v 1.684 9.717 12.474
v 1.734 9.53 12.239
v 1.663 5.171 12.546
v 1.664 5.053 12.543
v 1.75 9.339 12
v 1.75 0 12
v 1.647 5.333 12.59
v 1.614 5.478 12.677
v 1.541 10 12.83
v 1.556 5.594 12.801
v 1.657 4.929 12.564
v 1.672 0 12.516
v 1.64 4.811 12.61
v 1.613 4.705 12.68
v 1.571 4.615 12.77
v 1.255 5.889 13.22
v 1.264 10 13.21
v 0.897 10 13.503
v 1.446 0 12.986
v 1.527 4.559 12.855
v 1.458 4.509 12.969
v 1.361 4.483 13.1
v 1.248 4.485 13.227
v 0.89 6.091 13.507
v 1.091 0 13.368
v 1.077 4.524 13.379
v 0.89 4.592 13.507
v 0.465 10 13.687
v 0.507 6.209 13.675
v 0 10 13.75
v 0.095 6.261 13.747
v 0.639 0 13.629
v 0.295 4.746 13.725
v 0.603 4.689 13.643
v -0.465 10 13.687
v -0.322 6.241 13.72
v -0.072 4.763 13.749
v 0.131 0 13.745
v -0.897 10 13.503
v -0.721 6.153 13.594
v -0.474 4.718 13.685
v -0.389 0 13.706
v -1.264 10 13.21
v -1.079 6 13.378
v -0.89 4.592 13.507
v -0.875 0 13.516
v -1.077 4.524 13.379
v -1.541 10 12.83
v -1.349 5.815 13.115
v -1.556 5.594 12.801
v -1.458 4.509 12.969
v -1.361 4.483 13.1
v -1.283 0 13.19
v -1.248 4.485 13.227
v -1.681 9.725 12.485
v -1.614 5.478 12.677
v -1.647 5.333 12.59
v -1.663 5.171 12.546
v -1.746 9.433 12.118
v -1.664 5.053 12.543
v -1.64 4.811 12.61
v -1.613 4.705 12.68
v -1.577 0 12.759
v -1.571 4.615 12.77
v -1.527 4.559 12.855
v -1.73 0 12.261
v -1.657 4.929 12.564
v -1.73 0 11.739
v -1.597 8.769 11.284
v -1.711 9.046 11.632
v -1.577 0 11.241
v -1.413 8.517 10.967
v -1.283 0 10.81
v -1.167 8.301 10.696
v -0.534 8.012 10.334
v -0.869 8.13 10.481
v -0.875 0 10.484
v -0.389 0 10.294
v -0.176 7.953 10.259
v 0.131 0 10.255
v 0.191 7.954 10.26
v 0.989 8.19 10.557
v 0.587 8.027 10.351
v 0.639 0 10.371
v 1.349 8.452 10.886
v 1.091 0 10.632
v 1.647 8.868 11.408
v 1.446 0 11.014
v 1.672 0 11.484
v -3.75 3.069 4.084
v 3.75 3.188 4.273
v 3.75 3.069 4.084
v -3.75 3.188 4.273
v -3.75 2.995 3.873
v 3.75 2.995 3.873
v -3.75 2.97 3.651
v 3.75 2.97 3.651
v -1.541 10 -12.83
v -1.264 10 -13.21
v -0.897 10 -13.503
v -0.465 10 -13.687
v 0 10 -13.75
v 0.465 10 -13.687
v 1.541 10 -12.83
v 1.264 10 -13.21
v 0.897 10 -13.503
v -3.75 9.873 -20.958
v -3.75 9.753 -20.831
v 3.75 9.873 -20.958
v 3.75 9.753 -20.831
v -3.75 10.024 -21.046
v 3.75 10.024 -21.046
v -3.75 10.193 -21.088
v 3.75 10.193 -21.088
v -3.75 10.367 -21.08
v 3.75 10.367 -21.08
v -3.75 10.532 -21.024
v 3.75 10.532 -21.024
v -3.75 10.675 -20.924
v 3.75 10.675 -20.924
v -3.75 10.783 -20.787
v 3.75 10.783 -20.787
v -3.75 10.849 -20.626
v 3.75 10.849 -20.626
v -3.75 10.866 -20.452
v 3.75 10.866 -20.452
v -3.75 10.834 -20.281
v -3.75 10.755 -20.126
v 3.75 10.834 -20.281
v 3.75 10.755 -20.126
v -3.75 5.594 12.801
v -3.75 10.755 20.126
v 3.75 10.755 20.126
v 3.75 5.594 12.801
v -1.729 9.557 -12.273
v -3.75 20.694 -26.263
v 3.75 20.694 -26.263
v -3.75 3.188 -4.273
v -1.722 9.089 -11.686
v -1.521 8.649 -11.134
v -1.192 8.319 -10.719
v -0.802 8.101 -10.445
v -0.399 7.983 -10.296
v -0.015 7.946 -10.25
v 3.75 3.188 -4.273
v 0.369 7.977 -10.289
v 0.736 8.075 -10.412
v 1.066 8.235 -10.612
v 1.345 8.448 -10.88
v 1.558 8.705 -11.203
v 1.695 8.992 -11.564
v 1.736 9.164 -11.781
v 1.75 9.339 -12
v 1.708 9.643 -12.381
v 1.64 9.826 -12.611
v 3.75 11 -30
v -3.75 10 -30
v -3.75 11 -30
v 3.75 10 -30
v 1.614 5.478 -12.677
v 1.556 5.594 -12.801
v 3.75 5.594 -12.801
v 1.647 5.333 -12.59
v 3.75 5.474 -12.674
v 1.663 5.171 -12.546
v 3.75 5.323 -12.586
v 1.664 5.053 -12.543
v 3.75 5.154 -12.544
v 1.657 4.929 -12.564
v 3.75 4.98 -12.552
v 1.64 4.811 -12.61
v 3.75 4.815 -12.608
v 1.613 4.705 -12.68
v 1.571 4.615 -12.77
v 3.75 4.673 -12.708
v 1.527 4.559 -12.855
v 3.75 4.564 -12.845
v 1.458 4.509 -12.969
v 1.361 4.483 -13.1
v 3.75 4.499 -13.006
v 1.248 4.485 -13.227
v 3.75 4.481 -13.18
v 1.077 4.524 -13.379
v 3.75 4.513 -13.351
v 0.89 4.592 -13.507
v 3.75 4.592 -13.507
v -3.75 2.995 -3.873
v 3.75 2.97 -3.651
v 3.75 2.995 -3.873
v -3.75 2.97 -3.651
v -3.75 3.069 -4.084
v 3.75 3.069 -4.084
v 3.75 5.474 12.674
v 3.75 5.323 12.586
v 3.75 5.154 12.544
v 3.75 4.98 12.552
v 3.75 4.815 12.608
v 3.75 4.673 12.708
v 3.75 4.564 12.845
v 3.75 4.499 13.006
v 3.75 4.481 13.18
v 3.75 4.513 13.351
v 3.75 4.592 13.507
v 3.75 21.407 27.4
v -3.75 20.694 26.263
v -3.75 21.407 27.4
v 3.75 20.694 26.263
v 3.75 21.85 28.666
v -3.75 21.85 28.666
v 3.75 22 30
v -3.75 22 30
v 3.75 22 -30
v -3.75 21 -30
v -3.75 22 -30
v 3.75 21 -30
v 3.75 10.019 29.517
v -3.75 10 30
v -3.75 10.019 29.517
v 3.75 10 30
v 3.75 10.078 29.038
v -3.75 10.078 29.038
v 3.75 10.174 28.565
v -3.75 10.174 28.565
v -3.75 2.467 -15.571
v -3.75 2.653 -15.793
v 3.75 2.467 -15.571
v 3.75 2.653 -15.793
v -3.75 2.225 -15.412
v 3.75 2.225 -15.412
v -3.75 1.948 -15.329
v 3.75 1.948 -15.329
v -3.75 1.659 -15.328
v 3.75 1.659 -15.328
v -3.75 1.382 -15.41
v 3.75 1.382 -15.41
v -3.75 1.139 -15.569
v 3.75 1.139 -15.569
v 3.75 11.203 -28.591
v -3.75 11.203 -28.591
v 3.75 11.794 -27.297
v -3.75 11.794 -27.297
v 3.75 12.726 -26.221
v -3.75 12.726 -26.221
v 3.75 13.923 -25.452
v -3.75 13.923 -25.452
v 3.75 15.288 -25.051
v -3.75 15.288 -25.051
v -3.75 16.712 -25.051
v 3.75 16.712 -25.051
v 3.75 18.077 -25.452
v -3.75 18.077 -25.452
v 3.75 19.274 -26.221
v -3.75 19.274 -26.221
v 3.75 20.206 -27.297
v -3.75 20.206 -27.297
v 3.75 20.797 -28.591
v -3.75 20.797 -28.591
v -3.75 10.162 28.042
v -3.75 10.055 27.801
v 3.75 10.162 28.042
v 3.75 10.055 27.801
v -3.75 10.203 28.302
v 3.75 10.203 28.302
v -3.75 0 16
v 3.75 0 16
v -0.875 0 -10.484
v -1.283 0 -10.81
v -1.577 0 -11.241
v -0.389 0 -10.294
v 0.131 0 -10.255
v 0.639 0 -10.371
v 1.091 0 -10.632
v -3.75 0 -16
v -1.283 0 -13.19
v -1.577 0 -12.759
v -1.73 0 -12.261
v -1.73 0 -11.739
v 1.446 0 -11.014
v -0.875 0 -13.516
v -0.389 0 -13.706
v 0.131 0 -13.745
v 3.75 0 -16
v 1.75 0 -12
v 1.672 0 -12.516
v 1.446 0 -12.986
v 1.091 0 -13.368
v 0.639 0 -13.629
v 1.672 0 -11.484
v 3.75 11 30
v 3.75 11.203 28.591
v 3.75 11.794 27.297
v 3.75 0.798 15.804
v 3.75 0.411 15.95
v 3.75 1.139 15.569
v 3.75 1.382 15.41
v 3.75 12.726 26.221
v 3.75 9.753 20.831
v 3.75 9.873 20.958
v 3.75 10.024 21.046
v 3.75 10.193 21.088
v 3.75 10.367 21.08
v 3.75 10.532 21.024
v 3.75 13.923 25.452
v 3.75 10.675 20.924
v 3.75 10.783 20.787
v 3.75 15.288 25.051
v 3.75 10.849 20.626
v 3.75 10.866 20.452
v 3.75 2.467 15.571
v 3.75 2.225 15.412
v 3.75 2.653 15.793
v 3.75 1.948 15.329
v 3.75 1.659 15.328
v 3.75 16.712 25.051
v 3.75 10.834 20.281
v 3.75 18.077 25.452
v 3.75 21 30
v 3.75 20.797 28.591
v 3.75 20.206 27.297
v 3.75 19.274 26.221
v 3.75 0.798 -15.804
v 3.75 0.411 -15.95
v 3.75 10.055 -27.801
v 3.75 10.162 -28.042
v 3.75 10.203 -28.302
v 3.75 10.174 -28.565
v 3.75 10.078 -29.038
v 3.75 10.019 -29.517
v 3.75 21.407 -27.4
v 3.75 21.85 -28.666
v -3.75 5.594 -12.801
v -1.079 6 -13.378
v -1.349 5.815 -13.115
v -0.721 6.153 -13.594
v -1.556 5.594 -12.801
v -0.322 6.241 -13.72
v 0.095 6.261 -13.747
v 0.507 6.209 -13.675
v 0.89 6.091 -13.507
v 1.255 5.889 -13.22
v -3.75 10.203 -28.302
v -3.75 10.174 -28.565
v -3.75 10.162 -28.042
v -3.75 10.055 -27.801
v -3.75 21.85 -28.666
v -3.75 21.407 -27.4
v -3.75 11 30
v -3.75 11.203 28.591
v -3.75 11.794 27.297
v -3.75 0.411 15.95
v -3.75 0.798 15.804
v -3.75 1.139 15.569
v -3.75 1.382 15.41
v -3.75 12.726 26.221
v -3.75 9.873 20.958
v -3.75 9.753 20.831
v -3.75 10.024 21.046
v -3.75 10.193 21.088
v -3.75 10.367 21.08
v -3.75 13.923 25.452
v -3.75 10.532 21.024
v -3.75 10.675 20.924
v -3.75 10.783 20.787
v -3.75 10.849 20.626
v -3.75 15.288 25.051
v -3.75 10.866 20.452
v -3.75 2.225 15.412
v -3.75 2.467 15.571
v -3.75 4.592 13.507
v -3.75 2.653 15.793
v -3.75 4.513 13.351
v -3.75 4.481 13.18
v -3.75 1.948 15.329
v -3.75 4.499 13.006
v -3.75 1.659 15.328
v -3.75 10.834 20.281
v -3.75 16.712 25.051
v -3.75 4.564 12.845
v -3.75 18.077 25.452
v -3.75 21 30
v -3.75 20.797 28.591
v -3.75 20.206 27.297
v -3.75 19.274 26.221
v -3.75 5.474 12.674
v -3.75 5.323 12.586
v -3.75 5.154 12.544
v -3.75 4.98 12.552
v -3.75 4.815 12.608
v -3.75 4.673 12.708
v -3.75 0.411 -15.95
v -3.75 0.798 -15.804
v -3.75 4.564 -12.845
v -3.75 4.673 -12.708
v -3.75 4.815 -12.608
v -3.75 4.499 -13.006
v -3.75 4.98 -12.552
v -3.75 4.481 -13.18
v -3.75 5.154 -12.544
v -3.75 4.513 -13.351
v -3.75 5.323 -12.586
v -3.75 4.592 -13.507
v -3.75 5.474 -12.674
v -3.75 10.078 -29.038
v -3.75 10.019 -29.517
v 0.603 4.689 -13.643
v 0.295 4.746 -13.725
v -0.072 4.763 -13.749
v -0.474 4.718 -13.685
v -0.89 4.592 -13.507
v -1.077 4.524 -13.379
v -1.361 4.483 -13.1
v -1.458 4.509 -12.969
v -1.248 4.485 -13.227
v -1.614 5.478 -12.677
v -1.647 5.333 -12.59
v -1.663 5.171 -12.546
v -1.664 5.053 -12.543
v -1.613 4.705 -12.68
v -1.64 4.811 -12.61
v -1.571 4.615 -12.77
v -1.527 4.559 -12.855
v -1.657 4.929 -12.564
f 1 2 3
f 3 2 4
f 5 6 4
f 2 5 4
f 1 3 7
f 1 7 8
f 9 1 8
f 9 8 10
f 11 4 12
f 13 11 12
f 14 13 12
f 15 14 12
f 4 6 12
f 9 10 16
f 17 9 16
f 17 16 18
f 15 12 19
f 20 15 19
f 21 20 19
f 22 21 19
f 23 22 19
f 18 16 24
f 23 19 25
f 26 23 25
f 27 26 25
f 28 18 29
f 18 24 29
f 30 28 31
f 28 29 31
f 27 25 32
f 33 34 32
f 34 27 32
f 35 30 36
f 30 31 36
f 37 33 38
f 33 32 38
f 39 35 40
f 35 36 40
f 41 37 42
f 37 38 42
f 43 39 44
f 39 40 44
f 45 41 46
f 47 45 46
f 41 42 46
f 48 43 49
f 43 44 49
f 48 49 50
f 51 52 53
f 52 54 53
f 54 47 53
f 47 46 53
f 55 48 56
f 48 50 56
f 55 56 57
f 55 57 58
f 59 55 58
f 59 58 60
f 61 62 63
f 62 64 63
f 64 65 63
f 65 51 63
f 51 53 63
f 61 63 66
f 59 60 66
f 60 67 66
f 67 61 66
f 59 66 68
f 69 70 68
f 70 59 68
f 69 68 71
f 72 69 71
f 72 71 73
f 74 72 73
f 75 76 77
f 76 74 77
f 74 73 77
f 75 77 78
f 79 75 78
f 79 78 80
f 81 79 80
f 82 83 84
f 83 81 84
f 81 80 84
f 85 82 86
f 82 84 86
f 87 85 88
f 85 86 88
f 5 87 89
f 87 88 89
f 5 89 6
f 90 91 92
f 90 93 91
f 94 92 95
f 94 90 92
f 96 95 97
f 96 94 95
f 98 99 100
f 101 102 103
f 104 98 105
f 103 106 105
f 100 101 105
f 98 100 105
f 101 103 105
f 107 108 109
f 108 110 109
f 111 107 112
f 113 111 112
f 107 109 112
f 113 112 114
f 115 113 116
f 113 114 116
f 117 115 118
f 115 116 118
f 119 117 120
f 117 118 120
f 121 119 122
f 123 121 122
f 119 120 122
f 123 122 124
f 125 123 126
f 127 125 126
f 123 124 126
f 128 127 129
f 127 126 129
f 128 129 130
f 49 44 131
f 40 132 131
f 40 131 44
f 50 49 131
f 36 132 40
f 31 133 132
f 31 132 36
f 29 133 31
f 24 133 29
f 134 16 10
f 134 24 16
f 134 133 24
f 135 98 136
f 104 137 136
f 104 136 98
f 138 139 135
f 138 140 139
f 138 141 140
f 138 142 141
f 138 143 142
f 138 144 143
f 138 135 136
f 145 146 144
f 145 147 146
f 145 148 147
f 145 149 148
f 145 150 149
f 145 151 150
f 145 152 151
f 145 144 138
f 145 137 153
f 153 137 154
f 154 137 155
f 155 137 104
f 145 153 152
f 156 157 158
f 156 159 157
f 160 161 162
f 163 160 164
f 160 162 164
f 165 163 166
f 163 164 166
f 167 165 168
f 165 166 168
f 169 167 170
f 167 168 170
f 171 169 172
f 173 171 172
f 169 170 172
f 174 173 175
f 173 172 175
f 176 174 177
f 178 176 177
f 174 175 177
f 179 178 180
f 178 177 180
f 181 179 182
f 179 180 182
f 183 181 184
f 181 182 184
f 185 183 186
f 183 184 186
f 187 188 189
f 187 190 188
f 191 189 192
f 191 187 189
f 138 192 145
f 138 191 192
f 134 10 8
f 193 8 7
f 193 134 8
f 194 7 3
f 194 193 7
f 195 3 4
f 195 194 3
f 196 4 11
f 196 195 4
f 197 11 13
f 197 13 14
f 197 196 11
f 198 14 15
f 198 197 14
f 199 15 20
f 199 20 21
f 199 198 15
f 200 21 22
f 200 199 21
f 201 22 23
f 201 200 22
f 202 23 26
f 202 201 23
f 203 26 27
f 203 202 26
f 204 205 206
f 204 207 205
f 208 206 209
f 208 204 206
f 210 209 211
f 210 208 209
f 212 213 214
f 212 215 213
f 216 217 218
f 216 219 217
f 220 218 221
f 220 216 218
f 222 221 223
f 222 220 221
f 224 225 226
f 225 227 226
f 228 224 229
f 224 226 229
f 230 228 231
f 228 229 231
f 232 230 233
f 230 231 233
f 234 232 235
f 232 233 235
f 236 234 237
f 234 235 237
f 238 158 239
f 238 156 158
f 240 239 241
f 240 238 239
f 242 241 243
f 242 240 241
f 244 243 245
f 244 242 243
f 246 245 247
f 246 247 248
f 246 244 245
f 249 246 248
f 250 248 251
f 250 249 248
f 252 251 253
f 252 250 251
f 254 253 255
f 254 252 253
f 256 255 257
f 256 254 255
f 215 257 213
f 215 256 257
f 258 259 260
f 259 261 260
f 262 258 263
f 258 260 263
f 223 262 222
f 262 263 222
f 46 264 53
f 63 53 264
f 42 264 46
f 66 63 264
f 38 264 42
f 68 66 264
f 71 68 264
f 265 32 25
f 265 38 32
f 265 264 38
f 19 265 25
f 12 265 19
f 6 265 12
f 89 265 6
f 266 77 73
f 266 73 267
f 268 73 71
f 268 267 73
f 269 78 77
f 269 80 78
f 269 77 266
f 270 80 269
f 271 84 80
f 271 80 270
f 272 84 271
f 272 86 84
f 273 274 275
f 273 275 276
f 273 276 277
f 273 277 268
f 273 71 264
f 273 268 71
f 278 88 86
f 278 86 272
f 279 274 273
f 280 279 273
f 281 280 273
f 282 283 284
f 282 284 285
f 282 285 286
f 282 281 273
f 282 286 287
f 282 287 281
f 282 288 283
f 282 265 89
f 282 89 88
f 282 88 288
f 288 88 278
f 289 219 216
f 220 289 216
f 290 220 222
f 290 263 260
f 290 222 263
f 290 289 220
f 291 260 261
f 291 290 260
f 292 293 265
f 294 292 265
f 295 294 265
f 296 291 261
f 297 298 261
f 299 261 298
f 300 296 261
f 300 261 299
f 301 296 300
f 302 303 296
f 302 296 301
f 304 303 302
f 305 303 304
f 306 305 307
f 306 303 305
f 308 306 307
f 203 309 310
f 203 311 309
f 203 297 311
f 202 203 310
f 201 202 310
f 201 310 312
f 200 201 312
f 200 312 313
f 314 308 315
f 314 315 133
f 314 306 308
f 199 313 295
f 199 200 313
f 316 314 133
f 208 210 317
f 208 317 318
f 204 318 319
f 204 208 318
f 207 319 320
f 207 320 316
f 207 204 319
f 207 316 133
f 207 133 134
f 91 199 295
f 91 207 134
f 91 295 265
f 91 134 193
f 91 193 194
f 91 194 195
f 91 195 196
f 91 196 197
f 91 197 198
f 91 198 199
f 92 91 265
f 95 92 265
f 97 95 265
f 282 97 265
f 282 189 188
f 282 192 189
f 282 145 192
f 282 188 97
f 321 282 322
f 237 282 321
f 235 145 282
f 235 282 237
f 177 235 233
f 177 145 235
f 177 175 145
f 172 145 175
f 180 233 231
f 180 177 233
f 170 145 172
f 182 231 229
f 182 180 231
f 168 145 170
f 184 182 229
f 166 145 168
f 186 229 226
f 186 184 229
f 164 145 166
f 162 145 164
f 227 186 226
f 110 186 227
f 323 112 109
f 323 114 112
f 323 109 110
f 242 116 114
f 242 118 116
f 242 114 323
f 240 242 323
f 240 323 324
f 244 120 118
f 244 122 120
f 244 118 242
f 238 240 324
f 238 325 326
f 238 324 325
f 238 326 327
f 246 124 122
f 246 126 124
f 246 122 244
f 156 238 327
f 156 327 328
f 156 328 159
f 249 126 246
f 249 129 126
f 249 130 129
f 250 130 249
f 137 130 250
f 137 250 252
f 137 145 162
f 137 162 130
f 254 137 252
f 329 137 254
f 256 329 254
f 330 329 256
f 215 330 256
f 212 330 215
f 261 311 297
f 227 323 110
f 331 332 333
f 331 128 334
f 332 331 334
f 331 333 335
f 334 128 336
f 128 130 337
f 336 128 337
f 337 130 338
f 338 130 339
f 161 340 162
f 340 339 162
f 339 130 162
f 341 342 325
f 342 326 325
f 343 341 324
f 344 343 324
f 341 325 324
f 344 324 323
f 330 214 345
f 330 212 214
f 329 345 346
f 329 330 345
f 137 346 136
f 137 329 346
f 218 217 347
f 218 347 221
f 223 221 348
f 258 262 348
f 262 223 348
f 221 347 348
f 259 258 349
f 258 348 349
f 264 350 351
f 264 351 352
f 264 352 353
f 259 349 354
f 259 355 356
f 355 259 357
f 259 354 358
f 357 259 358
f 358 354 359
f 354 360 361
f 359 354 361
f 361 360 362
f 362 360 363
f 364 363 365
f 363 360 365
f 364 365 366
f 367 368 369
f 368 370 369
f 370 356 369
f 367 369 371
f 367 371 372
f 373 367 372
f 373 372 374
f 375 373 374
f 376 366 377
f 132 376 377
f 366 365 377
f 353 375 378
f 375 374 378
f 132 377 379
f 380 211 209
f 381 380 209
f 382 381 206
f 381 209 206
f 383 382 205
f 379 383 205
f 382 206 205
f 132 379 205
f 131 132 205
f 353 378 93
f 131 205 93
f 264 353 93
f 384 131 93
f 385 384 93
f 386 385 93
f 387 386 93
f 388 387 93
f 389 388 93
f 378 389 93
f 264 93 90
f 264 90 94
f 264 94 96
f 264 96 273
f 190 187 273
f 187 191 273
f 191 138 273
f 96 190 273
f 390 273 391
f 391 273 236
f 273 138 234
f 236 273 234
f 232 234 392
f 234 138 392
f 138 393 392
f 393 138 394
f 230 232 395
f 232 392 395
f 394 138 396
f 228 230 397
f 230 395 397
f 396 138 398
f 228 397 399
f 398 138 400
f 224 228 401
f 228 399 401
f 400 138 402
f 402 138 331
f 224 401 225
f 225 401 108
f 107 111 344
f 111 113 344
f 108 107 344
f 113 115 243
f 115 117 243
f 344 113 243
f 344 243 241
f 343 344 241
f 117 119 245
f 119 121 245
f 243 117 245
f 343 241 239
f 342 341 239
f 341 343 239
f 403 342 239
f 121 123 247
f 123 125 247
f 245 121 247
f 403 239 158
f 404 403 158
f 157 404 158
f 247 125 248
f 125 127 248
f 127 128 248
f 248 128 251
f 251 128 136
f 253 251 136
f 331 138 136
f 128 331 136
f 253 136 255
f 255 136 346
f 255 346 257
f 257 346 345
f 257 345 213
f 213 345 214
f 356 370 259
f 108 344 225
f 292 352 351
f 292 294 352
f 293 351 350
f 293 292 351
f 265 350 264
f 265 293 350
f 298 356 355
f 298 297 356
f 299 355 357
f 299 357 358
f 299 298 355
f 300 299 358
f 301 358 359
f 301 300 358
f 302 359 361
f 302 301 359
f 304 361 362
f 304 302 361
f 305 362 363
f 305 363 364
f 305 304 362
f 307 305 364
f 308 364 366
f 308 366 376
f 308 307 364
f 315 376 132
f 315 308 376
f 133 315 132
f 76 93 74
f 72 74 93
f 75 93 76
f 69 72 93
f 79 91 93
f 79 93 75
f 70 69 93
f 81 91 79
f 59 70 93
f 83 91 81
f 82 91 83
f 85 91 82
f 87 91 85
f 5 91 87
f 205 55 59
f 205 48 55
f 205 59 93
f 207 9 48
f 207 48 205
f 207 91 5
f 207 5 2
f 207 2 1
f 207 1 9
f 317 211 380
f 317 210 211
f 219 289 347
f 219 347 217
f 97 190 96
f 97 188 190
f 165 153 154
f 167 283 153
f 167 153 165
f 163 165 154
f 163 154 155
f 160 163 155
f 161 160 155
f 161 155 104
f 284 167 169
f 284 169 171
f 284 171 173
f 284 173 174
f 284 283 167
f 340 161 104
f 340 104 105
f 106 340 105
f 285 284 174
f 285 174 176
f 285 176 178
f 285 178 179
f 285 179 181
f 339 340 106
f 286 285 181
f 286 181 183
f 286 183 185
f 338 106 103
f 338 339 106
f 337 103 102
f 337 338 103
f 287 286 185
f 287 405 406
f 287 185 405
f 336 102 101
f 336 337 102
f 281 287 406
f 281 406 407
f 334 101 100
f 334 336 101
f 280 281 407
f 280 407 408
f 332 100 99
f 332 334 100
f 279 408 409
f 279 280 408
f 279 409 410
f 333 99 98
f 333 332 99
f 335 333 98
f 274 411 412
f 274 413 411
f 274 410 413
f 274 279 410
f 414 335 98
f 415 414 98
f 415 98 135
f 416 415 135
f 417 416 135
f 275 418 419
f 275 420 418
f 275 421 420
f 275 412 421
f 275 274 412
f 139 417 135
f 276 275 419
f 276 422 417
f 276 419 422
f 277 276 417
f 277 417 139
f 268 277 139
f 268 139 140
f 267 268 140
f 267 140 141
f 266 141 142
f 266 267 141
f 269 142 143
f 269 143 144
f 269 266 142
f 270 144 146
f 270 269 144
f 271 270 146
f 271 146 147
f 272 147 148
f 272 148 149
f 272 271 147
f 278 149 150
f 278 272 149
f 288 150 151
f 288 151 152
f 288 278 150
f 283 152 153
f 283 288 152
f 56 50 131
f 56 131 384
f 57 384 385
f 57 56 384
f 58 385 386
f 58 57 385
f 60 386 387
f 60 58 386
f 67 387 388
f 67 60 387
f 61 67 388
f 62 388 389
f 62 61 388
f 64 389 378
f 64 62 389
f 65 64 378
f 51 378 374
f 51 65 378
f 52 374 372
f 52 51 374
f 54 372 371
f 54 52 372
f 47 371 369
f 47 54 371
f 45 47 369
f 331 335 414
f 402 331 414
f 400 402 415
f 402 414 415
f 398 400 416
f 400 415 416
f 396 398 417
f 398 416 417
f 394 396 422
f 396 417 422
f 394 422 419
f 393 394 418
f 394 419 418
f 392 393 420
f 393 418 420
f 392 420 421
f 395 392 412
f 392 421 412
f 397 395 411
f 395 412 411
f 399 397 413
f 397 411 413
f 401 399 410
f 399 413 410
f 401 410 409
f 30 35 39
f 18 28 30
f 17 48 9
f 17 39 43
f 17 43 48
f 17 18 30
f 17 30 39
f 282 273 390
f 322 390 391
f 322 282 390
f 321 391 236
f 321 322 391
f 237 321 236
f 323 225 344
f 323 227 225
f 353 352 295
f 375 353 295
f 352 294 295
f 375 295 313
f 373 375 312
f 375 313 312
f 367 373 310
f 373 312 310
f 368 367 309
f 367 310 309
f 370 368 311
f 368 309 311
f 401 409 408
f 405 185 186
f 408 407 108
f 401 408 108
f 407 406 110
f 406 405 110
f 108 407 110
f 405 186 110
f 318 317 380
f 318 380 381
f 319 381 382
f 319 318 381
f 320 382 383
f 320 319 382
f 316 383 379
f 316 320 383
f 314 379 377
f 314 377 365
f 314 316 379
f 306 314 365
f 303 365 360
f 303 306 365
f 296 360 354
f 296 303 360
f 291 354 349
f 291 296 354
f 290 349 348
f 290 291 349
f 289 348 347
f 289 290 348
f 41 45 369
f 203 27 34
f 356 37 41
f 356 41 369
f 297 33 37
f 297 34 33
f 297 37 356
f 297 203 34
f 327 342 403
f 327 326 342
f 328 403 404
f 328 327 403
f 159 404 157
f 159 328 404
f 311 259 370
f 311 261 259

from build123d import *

# Parameters (mm, degrees)
ESTRUSIONE_ESTRUSIONE1_DEPTH = 3.75
RACCORDO2_R                  = 1
SCHIZZO3_R                   = 1.75
TAGLIO_ESTRUSIONE1_DEPTH     = 10


with BuildPart() as part:
    # Schizzo1 → Estrusione-Estrusione1 (new body, symmetric)
    with BuildSketch(Plane(origin=(0, 0, 0), x_dir=(0, 0, -1), z_dir=(1, 0, 0))):
        with BuildLine():
            Line((-30, 22), (-30, 21))
            ThreePointArc((-30, 21), (-25, 16), (-30, 11))
            Line((-30, 11), (-30, 10))
            ThreePointArc((-30, 10), (-29.075946517, 10.07158325), (-28.173941951, 10.284624946))
            Line((-28.173941951, 10.284624946), (-14.279791844, 1.720208156))
            ThreePointArc((-14.279791844, 1.720208156), (-15.496162696, 1.216370852), (-16, 0))
            Line((-16, 0), (16, 0))
            ThreePointArc((16, 0), (15.496162696, 1.216370852), (14.279791844, 1.720208156))
            Line((14.279791844, 1.720208156), (28.173941951, 10.284624946))
            ThreePointArc((28.173941951, 10.284624946), (29.075946517, 10.07158325), (30, 10))
            Line((30, 10), (30, 11))
            ThreePointArc((30, 11), (25, 16), (30, 21))
            Line((30, 21), (30, 22))
            ThreePointArc((30, 22), (28.020680207, 21.664123335), (26.262962858, 20.694097719))
            Line((26.262962858, 20.694097719), (4, 2.970240215))
            Line((4, 2.970240215), (-4, 2.970240215))
            Line((-4, 2.970240215), (-26.262962858, 20.694097719))
            ThreePointArc((-26.262962858, 20.694097719), (-28.020680207, 21.664123335), (-30, 22))
        make_face()
        with BuildLine():
            Line((-20.125796974, 10.754754637), (-12.80100478, 5.593685162))
            ThreePointArc((-12.80100478, 5.593685162), (-12.653117343, 4.740293889), (-13.506508616, 4.592406452))
            Line((-13.506508616, 4.592406452), (-20.83130081, 9.753475926))
            ThreePointArc((-20.83130081, 9.753475926), (-20.979188247, 10.606867199), (-20.125796974, 10.754754637))
        make_face(mode=Mode.SUBTRACT)
        with BuildLine():
            Line((20.125796974, 10.754754637), (12.80100478, 5.593685162))
            ThreePointArc((12.80100478, 5.593685162), (12.653117343, 4.740293889), (13.506508616, 4.592406452))
            Line((13.506508616, 4.592406452), (20.83130081, 9.753475926))
            ThreePointArc((20.83130081, 9.753475926), (20.979188247, 10.606867199), (20.125796974, 10.754754637))
        make_face(mode=Mode.SUBTRACT)
    extrude(amount=ESTRUSIONE_ESTRUSIONE1_DEPTH, both=True)

    # Raccordo2
    raccordo2_edges = [part.edges().sort_by_distance(p)[0] for p in [
        (0, 2.970240215, 4),
        (0, 2.970240215, -4),
        (0, 10.284624946, -28.173941951),
        (0, 1.720208156, -14.279791844),
        (0, 1.720208156, 14.279791844),
        (0, 10.284624946, 28.173941951),
    ]]
    fillet(raccordo2_edges, radius=RACCORDO2_R)

    # Schizzo3 → Taglio-Estrusione1 (cut)
    with BuildSketch(Plane.XZ):
        with Locations((0, 12)):
            Circle(SCHIZZO3_R)
    taglio_estrusione1 = extrude(amount=-TAGLIO_ESTRUSIONE1_DEPTH, mode=Mode.SUBTRACT)

    # Specchia1: Taglio-Estrusione1 across plane
    add(taglio_estrusione1.mirror(Plane.XY), mode=Mode.SUBTRACT)


solid = part.part
